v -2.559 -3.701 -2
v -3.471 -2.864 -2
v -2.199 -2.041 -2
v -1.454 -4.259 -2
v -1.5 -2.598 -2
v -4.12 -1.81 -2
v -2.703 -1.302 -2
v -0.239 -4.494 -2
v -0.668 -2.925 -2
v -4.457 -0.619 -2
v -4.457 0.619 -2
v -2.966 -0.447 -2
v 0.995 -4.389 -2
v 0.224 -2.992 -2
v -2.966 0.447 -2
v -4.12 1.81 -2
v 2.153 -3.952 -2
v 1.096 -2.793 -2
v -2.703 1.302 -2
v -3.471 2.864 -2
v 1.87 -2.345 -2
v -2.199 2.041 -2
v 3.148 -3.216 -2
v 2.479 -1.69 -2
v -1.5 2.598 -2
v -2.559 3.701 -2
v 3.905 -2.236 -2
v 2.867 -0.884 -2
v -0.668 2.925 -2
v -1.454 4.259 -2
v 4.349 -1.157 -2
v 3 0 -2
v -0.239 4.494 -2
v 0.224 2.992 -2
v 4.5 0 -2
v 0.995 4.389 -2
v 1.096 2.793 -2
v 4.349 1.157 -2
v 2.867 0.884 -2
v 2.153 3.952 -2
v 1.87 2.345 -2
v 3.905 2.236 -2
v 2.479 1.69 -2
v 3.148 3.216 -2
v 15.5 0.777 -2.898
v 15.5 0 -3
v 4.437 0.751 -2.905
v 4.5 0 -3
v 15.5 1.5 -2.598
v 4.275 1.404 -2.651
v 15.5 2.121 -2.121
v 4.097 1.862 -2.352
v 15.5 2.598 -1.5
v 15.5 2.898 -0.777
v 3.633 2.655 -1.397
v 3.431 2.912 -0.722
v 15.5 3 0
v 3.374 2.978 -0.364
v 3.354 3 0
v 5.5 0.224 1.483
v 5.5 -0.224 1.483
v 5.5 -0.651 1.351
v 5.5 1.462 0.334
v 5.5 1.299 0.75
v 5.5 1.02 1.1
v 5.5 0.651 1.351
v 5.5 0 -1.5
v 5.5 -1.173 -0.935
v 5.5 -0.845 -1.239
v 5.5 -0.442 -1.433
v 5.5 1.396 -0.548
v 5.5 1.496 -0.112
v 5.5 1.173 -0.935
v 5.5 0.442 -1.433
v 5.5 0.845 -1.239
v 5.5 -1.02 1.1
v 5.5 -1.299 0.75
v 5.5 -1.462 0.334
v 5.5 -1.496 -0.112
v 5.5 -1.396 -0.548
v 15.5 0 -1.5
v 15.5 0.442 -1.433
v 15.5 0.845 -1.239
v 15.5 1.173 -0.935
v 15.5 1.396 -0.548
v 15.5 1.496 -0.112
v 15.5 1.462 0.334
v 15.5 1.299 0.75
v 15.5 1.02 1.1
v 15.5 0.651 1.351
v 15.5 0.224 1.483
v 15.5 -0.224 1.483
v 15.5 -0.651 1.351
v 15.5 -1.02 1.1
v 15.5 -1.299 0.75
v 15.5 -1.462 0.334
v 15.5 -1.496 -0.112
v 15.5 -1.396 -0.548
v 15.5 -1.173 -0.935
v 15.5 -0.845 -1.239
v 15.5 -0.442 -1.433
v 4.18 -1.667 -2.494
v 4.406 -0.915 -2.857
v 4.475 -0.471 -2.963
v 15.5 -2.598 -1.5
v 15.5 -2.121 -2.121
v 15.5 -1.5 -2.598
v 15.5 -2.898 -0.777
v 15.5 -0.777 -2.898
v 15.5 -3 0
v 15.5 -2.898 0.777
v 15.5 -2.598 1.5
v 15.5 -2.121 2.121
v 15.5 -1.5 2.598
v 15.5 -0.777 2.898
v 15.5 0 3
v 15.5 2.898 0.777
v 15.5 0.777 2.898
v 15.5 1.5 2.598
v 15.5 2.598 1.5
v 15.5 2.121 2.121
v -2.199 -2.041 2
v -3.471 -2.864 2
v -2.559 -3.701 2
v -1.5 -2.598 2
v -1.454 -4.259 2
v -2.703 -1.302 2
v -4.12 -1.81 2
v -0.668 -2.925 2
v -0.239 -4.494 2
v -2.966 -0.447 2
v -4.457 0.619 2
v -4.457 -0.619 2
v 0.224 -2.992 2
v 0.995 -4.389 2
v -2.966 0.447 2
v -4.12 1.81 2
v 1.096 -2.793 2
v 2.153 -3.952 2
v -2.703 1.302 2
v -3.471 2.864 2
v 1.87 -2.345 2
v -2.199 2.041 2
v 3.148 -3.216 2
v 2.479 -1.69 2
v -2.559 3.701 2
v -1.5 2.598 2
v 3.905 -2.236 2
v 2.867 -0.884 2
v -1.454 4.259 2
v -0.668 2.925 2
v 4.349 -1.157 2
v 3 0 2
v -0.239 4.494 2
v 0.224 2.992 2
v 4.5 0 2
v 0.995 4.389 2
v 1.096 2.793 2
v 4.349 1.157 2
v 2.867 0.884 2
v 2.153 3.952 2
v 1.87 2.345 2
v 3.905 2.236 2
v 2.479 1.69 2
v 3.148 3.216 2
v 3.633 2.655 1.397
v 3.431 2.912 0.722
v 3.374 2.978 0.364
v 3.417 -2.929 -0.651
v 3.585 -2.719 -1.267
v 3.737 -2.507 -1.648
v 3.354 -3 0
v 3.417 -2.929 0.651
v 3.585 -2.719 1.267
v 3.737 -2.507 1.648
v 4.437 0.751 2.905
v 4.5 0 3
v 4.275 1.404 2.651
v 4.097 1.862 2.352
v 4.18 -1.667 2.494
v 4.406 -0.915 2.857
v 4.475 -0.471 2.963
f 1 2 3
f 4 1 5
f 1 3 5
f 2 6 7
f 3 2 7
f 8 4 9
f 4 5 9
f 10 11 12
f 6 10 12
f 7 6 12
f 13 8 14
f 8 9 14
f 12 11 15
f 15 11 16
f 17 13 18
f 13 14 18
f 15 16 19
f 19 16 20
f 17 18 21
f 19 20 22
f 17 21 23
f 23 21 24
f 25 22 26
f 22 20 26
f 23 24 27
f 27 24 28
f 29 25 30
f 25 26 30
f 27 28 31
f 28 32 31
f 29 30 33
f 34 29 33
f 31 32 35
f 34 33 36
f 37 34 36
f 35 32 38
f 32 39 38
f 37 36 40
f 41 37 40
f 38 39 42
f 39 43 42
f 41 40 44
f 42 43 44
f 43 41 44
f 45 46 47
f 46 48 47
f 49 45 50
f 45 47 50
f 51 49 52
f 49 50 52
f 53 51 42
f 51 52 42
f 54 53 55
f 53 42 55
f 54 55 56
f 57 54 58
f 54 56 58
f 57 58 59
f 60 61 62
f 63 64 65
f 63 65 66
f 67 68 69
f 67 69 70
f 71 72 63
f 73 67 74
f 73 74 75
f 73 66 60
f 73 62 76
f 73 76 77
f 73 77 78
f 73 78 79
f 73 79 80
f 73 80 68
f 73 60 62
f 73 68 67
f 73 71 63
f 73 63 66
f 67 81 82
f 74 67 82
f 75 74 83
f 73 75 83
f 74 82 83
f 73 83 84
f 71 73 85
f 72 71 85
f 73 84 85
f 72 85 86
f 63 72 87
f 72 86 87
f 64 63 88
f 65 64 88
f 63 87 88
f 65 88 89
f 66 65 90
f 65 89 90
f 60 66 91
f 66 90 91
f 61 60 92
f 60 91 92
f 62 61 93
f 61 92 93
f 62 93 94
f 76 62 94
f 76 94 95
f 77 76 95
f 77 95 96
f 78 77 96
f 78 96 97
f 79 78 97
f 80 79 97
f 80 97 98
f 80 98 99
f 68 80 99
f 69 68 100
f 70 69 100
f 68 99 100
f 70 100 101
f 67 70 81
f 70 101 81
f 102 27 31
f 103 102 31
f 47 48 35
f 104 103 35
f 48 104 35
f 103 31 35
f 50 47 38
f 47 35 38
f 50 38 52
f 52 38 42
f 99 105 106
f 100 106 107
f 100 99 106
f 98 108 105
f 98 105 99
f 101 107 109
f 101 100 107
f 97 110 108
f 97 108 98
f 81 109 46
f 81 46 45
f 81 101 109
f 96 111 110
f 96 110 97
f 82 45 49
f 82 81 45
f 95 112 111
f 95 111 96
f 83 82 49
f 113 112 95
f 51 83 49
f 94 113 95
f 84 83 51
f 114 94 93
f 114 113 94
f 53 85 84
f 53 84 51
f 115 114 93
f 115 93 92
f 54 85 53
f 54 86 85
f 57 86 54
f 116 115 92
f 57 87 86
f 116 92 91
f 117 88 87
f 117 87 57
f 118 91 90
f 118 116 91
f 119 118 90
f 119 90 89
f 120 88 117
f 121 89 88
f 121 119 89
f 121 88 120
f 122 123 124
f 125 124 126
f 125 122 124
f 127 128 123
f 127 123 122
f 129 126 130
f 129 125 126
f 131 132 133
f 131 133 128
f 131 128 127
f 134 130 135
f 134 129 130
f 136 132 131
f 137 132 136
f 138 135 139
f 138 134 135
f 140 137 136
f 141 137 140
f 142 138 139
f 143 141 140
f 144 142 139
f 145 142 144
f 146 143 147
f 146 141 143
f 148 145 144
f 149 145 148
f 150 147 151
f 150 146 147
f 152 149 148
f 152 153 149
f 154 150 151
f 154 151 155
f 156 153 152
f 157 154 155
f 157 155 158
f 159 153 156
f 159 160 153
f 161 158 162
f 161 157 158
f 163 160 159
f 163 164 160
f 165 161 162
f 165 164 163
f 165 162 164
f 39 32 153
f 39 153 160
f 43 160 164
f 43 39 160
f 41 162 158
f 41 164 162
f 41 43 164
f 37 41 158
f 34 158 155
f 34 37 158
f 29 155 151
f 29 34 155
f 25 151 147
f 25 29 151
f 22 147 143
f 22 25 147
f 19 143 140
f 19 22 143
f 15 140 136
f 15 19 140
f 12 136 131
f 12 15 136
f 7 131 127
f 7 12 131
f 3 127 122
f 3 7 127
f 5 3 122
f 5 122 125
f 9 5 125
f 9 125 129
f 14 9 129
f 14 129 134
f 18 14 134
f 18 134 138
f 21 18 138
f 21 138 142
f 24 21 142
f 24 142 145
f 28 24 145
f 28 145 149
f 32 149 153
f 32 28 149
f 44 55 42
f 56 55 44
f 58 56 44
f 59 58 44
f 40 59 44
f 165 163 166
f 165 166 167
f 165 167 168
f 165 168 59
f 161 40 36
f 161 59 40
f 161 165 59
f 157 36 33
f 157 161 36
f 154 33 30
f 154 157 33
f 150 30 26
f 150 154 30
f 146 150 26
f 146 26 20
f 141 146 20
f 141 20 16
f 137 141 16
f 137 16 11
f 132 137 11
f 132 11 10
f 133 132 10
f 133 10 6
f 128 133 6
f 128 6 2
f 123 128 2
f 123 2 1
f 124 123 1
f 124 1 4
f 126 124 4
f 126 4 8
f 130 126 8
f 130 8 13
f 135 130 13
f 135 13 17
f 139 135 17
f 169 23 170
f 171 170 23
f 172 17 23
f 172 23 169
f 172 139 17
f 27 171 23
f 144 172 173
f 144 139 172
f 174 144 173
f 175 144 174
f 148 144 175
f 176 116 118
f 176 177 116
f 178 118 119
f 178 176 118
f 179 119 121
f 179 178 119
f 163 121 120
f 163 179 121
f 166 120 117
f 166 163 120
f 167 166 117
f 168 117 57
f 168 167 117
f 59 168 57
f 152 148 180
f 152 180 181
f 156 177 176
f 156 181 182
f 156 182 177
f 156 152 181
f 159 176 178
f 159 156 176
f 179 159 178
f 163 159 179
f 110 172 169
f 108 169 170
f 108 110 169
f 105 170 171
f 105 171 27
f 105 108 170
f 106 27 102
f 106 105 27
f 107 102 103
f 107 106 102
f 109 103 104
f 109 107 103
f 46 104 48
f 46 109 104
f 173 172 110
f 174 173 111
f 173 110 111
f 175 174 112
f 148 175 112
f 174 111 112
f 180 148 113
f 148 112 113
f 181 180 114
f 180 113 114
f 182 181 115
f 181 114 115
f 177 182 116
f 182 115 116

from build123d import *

# Parameters (mm, degrees)
BOSS_EXTRUDE1_DEPTH     = 3
CUT_EXTRUDE1_DEPTH      = 18.219175358
CUT_EXTRUDE1_DEPTH_BACK = 18.219175358
SKETCH10_R              = 3
SKETCH11_R              = 1.5
CUT_EXTRUDE2_DEPTH      = 10
FILLET1_R               = 3
CUT_EXTRUDE3_START      = -2
SKETCH12_R              = 4.5
CUT_EXTRUDE3_DEPTH      = 10


with BuildPart() as part:
    # Sketch1 → Boss-Extrude1 (new, symmetric)
    with BuildSketch(Plane.XY):
        with BuildLine():
            Line((3.354101966, -3), (15.5, -3))
            Line((15.5, -3), (15.5, 3))
            Line((15.5, 3), (3.354101966, 3))
            ThreePointArc((3.354101966, 3), (-4.5, 0), (3.354101966, -3))
        make_face()
    extrude(amount=BOSS_EXTRUDE1_DEPTH, both=True)

    # Sketch10 → Cut-Extrude1 (cut, two sides: drawn at the far end of the back side and taken through both)
    with BuildSketch(Plane.XY.offset(3).offset(-CUT_EXTRUDE1_DEPTH_BACK)):
        Circle(SKETCH10_R)
    extrude(amount=CUT_EXTRUDE1_DEPTH + CUT_EXTRUDE1_DEPTH_BACK, mode=Mode.SUBTRACT)

    # Sketch11 → Cut-Extrude2 (cut)
    with BuildSketch(Plane(origin=(15.5, 0, 0), x_dir=(0, 0, -1), z_dir=(1, 0, 0))):
        Circle(SKETCH11_R)
    extrude(amount=-CUT_EXTRUDE2_DEPTH, mode=Mode.SUBTRACT)

    # Fillet1
    fillet1_edges = [part.edges().sort_by_distance(p)[0] for p in [
        (9.427050983, -3, 3),
        (9.427050983, -3, -3),
        (9.427050983, 3, -3),
        (9.427050983, 3, 3),
    ]]
    fillet(fillet1_edges, radius=FILLET1_R - 0.0001)  # a hair under: the kernel refuses the full size

    # Sketch12 → Cut-Extrude3 (cut)
    with BuildSketch(Plane.XY.offset(CUT_EXTRUDE3_START)):
        Circle(SKETCH12_R)
    cut_extrude3 = extrude(amount=-CUT_EXTRUDE3_DEPTH, mode=Mode.SUBTRACT)

    # Mirror1: Cut-Extrude3 across plane
    add(cut_extrude3.mirror(Plane.XY), mode=Mode.SUBTRACT)


solid = part.part
